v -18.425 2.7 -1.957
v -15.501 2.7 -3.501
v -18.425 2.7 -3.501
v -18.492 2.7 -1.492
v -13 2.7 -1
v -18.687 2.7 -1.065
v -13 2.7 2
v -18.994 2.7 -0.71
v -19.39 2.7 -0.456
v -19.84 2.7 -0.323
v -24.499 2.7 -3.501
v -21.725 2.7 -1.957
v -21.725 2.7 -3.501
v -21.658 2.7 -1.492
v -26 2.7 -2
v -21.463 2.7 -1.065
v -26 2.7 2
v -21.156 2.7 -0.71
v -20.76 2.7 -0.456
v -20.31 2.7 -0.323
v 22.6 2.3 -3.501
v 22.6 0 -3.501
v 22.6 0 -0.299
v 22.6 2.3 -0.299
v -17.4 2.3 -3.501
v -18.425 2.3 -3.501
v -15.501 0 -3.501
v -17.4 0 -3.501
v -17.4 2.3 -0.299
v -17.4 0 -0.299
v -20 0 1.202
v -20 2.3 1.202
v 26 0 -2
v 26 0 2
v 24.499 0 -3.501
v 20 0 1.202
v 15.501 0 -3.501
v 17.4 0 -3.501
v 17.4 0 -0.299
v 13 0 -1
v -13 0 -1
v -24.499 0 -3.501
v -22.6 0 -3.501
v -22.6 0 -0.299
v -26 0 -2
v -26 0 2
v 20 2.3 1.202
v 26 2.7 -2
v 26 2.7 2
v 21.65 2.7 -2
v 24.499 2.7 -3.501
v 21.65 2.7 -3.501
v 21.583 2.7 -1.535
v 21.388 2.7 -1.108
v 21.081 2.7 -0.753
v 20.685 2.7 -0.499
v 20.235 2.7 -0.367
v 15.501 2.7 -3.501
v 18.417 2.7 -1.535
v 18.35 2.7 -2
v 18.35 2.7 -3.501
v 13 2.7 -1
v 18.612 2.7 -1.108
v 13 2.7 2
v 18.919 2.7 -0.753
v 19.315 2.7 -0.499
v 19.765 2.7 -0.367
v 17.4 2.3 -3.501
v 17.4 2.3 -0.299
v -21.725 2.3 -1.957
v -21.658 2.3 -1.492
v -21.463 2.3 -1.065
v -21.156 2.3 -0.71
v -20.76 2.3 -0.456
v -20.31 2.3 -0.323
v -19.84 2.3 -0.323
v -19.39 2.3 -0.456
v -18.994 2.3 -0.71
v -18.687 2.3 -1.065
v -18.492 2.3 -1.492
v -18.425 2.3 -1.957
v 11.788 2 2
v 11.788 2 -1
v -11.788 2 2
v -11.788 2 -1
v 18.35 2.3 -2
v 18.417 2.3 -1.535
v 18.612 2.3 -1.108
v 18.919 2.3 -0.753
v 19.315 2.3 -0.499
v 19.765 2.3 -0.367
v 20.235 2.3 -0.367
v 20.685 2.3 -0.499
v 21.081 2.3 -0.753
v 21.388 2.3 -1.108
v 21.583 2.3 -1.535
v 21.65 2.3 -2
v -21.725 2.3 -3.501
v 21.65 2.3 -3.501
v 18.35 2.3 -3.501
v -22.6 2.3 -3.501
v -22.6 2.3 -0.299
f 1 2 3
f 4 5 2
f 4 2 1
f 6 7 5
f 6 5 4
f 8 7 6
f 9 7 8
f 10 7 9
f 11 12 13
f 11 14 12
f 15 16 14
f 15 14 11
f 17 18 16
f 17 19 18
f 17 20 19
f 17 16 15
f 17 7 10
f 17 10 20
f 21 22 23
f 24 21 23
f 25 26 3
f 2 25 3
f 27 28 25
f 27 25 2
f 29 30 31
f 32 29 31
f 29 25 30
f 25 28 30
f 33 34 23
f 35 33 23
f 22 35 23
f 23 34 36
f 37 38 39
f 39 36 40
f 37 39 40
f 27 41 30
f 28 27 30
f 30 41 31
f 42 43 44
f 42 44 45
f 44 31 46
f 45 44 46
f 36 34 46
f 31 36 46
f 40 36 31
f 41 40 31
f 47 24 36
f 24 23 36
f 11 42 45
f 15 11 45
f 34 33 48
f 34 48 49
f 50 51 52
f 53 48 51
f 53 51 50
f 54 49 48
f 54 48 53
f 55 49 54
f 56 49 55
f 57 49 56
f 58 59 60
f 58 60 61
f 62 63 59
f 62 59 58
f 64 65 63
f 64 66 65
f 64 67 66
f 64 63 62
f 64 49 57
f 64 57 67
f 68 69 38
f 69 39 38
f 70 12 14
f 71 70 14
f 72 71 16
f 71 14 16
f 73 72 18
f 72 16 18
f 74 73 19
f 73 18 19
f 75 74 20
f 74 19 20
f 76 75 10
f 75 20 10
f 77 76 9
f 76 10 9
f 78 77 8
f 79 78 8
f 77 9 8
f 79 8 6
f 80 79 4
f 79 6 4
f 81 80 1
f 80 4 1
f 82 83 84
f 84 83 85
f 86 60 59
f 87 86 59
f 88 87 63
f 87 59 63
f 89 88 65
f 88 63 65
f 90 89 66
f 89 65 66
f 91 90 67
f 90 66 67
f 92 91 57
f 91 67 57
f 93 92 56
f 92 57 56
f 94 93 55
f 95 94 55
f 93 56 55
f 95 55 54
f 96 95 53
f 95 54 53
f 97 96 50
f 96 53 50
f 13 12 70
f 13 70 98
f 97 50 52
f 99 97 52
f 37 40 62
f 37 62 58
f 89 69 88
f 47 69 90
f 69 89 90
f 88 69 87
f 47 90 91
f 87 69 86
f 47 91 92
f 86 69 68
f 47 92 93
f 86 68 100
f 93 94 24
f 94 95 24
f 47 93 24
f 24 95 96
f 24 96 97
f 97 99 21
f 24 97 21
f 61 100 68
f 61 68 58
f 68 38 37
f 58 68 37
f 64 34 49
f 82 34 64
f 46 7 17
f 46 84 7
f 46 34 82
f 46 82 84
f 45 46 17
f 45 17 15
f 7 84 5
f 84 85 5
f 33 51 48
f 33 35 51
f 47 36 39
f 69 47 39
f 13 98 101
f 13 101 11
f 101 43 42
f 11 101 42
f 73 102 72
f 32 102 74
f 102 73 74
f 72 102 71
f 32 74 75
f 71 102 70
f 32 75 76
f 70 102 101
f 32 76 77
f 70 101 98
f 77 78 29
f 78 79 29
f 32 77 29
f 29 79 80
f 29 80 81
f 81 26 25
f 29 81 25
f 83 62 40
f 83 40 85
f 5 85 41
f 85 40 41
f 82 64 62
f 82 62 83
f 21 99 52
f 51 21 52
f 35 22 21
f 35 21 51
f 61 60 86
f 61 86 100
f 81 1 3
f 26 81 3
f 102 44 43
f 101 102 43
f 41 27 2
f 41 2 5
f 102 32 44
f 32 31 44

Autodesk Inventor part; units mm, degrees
ref_plane "YZ Plane" through (0, 0, 0) normal (1, 0, 0) x (0, 1, 0)
ref_plane "XZ Plane" through (0, 0, 0) normal (0, 1, 0) x (-1, 0, 0)
ref_plane "XY Plane" through (0, 0, 0) normal (0, 0, 1) x (1, 0, 0)
sketch "Náčrt1" plane through (0, 0, 0) normal (0, 1, 0) x (-1, 0, 0)
  line L0 (14, -2) -> (10.9978, 1.0022)
  line L1 (10.9978, 1.0022) -> (-10.9978, 1.0022)
  line L2 (-10.9978, 1.0022) -> (-14, -2)
  line L3 (-14, -2) -> (-26, -2)
  line L4 (-26, -2) -> (-26, 2)
  line L5 (-26, 2) -> (26, 2)
  line L6 (26, 2) -> (26, -2)
  line L7 (26, -2) -> (14, -2)
  line L8 (20, 1.0022) -> (22.6, -0.4989)
  line L9 (22.6, -0.4989) -> (22.6, -3.5011)
  line L10 (22.6, -3.5011) -> (20, -5.0022)
  line L11 (20, -5.0022) -> (17.4, -3.5011)
  line L12 (17.4, -3.5011) -> (17.4, -0.4989)
  line L13 (17.4, -0.4989) -> (20, 1.0022)
  line L14 (-20, 1.0022) -> (-17.4, -0.4989)
  line L15 (-17.4, -0.4989) -> (-17.4, -3.5011)
  line L16 (-17.4, -3.5011) -> (-20, -5.0022)
  line L17 (-20, -5.0022) -> (-22.6, -3.5011)
  line L18 (-22.6, -3.5011) -> (-22.6, -0.4989)
  line L19 (-22.6, -0.4989) -> (-20, 1.0022)
  line L20 (26, 2) -> (0, 0) construction
  line L21 (0, 0) -> (-26, 2) construction
  line L22 (26, -2) -> (0, 0) construction
  line L23 (-17.4, -3.5011) -> (-15.5011, -3.5011)
  line L24 (-15.5011, -3.5011) -> (-14, -2)
  line L25 (17.4, -3.5011) -> (15.5011, -3.5011)
  line L26 (15.5011, -3.5011) -> (14, -2)
  line L27 (-22.6, -3.5011) -> (-24.4989, -3.5011)
  line L28 (-24.4989, -3.5011) -> (-26, -2)
  line L29 (22.6, -3.5011) -> (24.4989, -3.5011)
  line L30 (24.4989, -3.5011) -> (26, -2)
  line L31 (-13, -1) -> (13, -1)
  line L32 (-22.6, -0.4989) -> (-22.6, -0.2989)
  line L33 (-22.6, -0.2989) -> (-20, 1.2022)
  line L34 (-20, 1.2022) -> (-17.4, -0.2989)
  line L35 (-17.4, -0.2989) -> (-17.4, -0.4989)
  line L36 (17.4, -0.4989) -> (17.4, -0.2989)
  line L37 (17.4, -0.2989) -> (20, 1.2022)
  line L38 (20, 1.2022) -> (22.6, -0.2989)
  line L39 (22.6, -0.2989) -> (22.6, -0.4989)
  point P0 (20, -2)
  point P1 (-20, -2)
  dimension "d0" = 5.2
  dimension "d1" = 40
  dimension "d4" = 4
  dimension "d6" = 45
  dimension "d7" = 1
  dimension "d8" = 52
  dimension "d19" = 0.2
  dimension "d20" = 0.2
extrude "Vysunutí1" add sketch "Náčrt1" along normal blind 2.7 contours L0 L1 L2 L3 L15 L35 L34 L33 L32 L18 L4 L5 L6 L7 L9 L39 L38 L37 L36 L12 | L7 L12 L25 L26 | L31 L2 L1 L0 | L7 L30 L29 L9 | L24 L23 L15 L3 | L18 L27 L28 L3
sketch "Náčrt2" plane through (0, 2.7, 0) normal (0, 1, 0) x (1, 0, 0)
  line L0 (-13, 1) -> (-15.5011, 3.5011) projected
  line L1 (-15.5011, 3.5011) -> (-17.4, 3.5011) projected
  line L2 (-17.4, 3.5011) -> (-17.4, 0.2989) projected
  line L3 (-22.6, 0.2989) -> (-22.6, 3.5011) projected
  line L4 (-22.6, 3.5011) -> (-24.4989, 3.5011) projected
  line L5 (-24.4989, 3.5011) -> (-26, 2) projected
  line L6 (-26, 2) -> (-26, -2) projected
  line L7 (-26, -2) -> (26, -2) projected
  line L8 (26, -2) -> (26, 2) projected
  line L9 (26, 2) -> (24.4989, 3.5011) projected
  line L10 (24.4989, 3.5011) -> (22.6, 3.5011) projected
  line L11 (22.6, 3.5011) -> (22.6, 0.2989) projected
  line L12 (17.4, 0.2989) -> (17.4, 3.5011) projected
  line L13 (17.4, 3.5011) -> (15.5011, 3.5011) projected
  line L14 (15.5011, 3.5011) -> (13, 1) projected
  line L15 (13, 1) -> (-13, 1) projected
  circle A0 centre (-20.075, 1.9567) radius 1.65
  circle A1 centre (20, 2) radius 1.65
  line L16 (-22.75, 0.4123) -> (-20.075, 1.9567) construction
  line L17 (-20.075, 1.9567) -> (-17.4, 0.4123) construction
  line L18 (-20.075, 1.9567) -> (-20.075, -1.1321) construction
  line L19 (20, 2) -> (22.675, 0.4556) construction
  line L20 (20, -1.0888) -> (20, 2) construction
  line L21 (17.325, 0.4556) -> (20, 2) construction
  line L22 (-22.6, 3.5011) -> (-17.4, 3.5011)
  line L23 (22.6, 3.5011) -> (17.4, 3.5011)
  line L24 (18.35, 2) -> (18.35, 3.5011)
  line L25 (21.65, 2) -> (21.65, 3.5011)
  line L26 (-18.425, 1.9567) -> (-18.425, 3.5011)
  line L27 (-21.725, 1.9567) -> (-21.725, 3.5011)
  line L28 (-17.4, 0.2989) -> (-20, -1.2022) projected
  line L29 (-20, -1.2022) -> (-22.6, 0.2989) projected
  line L30 (22.6, 0.2989) -> (20, -1.2022) projected
  line L31 (20, -1.2022) -> (17.4, 0.2989) projected
  point P0 (0, 0)
  point P1 (19.315, 3.5011)
  point P2 (20.685, 3.5011)
  point P3 (-20.6558, 3.5011)
  point P4 (-19.4942, 3.5011)
  dimension "d11" = 3.3
extrude "Vysunutí2" add sketch "Náčrt2" against normal blind 0.4 contours L2 L28 L29 L3 L22 L27 A0 L26 | L23 L24 A1 L25 L11 L30 L31 L12
sketch "Náčrt3" plane through (13, 0, -1) normal (0, 0, -1) x (-1, 0, 0)
  line L0 (0, 0) -> (26, 0) projected
  line L1 (26, 0) -> (26, 2.7) projected
  line L2 (0, 2.7) -> (26, 2.7) projected
  line L3 (0, 0) -> (0, 2.7) projected
  line L4 (0, 2.7) -> (1.2124, 2)
  line L5 (1.2124, 2) -> (24.7876, 2)
  line L6 (24.7876, 2) -> (26, 2.7)
  point P0 (13, 0)
  dimension "d14" = 2
  dimension "d16" = 60
extrude "Vysunutí3" cut sketch "Náčrt3" against normal through all contours L2 L6 L5 L4
properties part number "miniboard nutt holder"
